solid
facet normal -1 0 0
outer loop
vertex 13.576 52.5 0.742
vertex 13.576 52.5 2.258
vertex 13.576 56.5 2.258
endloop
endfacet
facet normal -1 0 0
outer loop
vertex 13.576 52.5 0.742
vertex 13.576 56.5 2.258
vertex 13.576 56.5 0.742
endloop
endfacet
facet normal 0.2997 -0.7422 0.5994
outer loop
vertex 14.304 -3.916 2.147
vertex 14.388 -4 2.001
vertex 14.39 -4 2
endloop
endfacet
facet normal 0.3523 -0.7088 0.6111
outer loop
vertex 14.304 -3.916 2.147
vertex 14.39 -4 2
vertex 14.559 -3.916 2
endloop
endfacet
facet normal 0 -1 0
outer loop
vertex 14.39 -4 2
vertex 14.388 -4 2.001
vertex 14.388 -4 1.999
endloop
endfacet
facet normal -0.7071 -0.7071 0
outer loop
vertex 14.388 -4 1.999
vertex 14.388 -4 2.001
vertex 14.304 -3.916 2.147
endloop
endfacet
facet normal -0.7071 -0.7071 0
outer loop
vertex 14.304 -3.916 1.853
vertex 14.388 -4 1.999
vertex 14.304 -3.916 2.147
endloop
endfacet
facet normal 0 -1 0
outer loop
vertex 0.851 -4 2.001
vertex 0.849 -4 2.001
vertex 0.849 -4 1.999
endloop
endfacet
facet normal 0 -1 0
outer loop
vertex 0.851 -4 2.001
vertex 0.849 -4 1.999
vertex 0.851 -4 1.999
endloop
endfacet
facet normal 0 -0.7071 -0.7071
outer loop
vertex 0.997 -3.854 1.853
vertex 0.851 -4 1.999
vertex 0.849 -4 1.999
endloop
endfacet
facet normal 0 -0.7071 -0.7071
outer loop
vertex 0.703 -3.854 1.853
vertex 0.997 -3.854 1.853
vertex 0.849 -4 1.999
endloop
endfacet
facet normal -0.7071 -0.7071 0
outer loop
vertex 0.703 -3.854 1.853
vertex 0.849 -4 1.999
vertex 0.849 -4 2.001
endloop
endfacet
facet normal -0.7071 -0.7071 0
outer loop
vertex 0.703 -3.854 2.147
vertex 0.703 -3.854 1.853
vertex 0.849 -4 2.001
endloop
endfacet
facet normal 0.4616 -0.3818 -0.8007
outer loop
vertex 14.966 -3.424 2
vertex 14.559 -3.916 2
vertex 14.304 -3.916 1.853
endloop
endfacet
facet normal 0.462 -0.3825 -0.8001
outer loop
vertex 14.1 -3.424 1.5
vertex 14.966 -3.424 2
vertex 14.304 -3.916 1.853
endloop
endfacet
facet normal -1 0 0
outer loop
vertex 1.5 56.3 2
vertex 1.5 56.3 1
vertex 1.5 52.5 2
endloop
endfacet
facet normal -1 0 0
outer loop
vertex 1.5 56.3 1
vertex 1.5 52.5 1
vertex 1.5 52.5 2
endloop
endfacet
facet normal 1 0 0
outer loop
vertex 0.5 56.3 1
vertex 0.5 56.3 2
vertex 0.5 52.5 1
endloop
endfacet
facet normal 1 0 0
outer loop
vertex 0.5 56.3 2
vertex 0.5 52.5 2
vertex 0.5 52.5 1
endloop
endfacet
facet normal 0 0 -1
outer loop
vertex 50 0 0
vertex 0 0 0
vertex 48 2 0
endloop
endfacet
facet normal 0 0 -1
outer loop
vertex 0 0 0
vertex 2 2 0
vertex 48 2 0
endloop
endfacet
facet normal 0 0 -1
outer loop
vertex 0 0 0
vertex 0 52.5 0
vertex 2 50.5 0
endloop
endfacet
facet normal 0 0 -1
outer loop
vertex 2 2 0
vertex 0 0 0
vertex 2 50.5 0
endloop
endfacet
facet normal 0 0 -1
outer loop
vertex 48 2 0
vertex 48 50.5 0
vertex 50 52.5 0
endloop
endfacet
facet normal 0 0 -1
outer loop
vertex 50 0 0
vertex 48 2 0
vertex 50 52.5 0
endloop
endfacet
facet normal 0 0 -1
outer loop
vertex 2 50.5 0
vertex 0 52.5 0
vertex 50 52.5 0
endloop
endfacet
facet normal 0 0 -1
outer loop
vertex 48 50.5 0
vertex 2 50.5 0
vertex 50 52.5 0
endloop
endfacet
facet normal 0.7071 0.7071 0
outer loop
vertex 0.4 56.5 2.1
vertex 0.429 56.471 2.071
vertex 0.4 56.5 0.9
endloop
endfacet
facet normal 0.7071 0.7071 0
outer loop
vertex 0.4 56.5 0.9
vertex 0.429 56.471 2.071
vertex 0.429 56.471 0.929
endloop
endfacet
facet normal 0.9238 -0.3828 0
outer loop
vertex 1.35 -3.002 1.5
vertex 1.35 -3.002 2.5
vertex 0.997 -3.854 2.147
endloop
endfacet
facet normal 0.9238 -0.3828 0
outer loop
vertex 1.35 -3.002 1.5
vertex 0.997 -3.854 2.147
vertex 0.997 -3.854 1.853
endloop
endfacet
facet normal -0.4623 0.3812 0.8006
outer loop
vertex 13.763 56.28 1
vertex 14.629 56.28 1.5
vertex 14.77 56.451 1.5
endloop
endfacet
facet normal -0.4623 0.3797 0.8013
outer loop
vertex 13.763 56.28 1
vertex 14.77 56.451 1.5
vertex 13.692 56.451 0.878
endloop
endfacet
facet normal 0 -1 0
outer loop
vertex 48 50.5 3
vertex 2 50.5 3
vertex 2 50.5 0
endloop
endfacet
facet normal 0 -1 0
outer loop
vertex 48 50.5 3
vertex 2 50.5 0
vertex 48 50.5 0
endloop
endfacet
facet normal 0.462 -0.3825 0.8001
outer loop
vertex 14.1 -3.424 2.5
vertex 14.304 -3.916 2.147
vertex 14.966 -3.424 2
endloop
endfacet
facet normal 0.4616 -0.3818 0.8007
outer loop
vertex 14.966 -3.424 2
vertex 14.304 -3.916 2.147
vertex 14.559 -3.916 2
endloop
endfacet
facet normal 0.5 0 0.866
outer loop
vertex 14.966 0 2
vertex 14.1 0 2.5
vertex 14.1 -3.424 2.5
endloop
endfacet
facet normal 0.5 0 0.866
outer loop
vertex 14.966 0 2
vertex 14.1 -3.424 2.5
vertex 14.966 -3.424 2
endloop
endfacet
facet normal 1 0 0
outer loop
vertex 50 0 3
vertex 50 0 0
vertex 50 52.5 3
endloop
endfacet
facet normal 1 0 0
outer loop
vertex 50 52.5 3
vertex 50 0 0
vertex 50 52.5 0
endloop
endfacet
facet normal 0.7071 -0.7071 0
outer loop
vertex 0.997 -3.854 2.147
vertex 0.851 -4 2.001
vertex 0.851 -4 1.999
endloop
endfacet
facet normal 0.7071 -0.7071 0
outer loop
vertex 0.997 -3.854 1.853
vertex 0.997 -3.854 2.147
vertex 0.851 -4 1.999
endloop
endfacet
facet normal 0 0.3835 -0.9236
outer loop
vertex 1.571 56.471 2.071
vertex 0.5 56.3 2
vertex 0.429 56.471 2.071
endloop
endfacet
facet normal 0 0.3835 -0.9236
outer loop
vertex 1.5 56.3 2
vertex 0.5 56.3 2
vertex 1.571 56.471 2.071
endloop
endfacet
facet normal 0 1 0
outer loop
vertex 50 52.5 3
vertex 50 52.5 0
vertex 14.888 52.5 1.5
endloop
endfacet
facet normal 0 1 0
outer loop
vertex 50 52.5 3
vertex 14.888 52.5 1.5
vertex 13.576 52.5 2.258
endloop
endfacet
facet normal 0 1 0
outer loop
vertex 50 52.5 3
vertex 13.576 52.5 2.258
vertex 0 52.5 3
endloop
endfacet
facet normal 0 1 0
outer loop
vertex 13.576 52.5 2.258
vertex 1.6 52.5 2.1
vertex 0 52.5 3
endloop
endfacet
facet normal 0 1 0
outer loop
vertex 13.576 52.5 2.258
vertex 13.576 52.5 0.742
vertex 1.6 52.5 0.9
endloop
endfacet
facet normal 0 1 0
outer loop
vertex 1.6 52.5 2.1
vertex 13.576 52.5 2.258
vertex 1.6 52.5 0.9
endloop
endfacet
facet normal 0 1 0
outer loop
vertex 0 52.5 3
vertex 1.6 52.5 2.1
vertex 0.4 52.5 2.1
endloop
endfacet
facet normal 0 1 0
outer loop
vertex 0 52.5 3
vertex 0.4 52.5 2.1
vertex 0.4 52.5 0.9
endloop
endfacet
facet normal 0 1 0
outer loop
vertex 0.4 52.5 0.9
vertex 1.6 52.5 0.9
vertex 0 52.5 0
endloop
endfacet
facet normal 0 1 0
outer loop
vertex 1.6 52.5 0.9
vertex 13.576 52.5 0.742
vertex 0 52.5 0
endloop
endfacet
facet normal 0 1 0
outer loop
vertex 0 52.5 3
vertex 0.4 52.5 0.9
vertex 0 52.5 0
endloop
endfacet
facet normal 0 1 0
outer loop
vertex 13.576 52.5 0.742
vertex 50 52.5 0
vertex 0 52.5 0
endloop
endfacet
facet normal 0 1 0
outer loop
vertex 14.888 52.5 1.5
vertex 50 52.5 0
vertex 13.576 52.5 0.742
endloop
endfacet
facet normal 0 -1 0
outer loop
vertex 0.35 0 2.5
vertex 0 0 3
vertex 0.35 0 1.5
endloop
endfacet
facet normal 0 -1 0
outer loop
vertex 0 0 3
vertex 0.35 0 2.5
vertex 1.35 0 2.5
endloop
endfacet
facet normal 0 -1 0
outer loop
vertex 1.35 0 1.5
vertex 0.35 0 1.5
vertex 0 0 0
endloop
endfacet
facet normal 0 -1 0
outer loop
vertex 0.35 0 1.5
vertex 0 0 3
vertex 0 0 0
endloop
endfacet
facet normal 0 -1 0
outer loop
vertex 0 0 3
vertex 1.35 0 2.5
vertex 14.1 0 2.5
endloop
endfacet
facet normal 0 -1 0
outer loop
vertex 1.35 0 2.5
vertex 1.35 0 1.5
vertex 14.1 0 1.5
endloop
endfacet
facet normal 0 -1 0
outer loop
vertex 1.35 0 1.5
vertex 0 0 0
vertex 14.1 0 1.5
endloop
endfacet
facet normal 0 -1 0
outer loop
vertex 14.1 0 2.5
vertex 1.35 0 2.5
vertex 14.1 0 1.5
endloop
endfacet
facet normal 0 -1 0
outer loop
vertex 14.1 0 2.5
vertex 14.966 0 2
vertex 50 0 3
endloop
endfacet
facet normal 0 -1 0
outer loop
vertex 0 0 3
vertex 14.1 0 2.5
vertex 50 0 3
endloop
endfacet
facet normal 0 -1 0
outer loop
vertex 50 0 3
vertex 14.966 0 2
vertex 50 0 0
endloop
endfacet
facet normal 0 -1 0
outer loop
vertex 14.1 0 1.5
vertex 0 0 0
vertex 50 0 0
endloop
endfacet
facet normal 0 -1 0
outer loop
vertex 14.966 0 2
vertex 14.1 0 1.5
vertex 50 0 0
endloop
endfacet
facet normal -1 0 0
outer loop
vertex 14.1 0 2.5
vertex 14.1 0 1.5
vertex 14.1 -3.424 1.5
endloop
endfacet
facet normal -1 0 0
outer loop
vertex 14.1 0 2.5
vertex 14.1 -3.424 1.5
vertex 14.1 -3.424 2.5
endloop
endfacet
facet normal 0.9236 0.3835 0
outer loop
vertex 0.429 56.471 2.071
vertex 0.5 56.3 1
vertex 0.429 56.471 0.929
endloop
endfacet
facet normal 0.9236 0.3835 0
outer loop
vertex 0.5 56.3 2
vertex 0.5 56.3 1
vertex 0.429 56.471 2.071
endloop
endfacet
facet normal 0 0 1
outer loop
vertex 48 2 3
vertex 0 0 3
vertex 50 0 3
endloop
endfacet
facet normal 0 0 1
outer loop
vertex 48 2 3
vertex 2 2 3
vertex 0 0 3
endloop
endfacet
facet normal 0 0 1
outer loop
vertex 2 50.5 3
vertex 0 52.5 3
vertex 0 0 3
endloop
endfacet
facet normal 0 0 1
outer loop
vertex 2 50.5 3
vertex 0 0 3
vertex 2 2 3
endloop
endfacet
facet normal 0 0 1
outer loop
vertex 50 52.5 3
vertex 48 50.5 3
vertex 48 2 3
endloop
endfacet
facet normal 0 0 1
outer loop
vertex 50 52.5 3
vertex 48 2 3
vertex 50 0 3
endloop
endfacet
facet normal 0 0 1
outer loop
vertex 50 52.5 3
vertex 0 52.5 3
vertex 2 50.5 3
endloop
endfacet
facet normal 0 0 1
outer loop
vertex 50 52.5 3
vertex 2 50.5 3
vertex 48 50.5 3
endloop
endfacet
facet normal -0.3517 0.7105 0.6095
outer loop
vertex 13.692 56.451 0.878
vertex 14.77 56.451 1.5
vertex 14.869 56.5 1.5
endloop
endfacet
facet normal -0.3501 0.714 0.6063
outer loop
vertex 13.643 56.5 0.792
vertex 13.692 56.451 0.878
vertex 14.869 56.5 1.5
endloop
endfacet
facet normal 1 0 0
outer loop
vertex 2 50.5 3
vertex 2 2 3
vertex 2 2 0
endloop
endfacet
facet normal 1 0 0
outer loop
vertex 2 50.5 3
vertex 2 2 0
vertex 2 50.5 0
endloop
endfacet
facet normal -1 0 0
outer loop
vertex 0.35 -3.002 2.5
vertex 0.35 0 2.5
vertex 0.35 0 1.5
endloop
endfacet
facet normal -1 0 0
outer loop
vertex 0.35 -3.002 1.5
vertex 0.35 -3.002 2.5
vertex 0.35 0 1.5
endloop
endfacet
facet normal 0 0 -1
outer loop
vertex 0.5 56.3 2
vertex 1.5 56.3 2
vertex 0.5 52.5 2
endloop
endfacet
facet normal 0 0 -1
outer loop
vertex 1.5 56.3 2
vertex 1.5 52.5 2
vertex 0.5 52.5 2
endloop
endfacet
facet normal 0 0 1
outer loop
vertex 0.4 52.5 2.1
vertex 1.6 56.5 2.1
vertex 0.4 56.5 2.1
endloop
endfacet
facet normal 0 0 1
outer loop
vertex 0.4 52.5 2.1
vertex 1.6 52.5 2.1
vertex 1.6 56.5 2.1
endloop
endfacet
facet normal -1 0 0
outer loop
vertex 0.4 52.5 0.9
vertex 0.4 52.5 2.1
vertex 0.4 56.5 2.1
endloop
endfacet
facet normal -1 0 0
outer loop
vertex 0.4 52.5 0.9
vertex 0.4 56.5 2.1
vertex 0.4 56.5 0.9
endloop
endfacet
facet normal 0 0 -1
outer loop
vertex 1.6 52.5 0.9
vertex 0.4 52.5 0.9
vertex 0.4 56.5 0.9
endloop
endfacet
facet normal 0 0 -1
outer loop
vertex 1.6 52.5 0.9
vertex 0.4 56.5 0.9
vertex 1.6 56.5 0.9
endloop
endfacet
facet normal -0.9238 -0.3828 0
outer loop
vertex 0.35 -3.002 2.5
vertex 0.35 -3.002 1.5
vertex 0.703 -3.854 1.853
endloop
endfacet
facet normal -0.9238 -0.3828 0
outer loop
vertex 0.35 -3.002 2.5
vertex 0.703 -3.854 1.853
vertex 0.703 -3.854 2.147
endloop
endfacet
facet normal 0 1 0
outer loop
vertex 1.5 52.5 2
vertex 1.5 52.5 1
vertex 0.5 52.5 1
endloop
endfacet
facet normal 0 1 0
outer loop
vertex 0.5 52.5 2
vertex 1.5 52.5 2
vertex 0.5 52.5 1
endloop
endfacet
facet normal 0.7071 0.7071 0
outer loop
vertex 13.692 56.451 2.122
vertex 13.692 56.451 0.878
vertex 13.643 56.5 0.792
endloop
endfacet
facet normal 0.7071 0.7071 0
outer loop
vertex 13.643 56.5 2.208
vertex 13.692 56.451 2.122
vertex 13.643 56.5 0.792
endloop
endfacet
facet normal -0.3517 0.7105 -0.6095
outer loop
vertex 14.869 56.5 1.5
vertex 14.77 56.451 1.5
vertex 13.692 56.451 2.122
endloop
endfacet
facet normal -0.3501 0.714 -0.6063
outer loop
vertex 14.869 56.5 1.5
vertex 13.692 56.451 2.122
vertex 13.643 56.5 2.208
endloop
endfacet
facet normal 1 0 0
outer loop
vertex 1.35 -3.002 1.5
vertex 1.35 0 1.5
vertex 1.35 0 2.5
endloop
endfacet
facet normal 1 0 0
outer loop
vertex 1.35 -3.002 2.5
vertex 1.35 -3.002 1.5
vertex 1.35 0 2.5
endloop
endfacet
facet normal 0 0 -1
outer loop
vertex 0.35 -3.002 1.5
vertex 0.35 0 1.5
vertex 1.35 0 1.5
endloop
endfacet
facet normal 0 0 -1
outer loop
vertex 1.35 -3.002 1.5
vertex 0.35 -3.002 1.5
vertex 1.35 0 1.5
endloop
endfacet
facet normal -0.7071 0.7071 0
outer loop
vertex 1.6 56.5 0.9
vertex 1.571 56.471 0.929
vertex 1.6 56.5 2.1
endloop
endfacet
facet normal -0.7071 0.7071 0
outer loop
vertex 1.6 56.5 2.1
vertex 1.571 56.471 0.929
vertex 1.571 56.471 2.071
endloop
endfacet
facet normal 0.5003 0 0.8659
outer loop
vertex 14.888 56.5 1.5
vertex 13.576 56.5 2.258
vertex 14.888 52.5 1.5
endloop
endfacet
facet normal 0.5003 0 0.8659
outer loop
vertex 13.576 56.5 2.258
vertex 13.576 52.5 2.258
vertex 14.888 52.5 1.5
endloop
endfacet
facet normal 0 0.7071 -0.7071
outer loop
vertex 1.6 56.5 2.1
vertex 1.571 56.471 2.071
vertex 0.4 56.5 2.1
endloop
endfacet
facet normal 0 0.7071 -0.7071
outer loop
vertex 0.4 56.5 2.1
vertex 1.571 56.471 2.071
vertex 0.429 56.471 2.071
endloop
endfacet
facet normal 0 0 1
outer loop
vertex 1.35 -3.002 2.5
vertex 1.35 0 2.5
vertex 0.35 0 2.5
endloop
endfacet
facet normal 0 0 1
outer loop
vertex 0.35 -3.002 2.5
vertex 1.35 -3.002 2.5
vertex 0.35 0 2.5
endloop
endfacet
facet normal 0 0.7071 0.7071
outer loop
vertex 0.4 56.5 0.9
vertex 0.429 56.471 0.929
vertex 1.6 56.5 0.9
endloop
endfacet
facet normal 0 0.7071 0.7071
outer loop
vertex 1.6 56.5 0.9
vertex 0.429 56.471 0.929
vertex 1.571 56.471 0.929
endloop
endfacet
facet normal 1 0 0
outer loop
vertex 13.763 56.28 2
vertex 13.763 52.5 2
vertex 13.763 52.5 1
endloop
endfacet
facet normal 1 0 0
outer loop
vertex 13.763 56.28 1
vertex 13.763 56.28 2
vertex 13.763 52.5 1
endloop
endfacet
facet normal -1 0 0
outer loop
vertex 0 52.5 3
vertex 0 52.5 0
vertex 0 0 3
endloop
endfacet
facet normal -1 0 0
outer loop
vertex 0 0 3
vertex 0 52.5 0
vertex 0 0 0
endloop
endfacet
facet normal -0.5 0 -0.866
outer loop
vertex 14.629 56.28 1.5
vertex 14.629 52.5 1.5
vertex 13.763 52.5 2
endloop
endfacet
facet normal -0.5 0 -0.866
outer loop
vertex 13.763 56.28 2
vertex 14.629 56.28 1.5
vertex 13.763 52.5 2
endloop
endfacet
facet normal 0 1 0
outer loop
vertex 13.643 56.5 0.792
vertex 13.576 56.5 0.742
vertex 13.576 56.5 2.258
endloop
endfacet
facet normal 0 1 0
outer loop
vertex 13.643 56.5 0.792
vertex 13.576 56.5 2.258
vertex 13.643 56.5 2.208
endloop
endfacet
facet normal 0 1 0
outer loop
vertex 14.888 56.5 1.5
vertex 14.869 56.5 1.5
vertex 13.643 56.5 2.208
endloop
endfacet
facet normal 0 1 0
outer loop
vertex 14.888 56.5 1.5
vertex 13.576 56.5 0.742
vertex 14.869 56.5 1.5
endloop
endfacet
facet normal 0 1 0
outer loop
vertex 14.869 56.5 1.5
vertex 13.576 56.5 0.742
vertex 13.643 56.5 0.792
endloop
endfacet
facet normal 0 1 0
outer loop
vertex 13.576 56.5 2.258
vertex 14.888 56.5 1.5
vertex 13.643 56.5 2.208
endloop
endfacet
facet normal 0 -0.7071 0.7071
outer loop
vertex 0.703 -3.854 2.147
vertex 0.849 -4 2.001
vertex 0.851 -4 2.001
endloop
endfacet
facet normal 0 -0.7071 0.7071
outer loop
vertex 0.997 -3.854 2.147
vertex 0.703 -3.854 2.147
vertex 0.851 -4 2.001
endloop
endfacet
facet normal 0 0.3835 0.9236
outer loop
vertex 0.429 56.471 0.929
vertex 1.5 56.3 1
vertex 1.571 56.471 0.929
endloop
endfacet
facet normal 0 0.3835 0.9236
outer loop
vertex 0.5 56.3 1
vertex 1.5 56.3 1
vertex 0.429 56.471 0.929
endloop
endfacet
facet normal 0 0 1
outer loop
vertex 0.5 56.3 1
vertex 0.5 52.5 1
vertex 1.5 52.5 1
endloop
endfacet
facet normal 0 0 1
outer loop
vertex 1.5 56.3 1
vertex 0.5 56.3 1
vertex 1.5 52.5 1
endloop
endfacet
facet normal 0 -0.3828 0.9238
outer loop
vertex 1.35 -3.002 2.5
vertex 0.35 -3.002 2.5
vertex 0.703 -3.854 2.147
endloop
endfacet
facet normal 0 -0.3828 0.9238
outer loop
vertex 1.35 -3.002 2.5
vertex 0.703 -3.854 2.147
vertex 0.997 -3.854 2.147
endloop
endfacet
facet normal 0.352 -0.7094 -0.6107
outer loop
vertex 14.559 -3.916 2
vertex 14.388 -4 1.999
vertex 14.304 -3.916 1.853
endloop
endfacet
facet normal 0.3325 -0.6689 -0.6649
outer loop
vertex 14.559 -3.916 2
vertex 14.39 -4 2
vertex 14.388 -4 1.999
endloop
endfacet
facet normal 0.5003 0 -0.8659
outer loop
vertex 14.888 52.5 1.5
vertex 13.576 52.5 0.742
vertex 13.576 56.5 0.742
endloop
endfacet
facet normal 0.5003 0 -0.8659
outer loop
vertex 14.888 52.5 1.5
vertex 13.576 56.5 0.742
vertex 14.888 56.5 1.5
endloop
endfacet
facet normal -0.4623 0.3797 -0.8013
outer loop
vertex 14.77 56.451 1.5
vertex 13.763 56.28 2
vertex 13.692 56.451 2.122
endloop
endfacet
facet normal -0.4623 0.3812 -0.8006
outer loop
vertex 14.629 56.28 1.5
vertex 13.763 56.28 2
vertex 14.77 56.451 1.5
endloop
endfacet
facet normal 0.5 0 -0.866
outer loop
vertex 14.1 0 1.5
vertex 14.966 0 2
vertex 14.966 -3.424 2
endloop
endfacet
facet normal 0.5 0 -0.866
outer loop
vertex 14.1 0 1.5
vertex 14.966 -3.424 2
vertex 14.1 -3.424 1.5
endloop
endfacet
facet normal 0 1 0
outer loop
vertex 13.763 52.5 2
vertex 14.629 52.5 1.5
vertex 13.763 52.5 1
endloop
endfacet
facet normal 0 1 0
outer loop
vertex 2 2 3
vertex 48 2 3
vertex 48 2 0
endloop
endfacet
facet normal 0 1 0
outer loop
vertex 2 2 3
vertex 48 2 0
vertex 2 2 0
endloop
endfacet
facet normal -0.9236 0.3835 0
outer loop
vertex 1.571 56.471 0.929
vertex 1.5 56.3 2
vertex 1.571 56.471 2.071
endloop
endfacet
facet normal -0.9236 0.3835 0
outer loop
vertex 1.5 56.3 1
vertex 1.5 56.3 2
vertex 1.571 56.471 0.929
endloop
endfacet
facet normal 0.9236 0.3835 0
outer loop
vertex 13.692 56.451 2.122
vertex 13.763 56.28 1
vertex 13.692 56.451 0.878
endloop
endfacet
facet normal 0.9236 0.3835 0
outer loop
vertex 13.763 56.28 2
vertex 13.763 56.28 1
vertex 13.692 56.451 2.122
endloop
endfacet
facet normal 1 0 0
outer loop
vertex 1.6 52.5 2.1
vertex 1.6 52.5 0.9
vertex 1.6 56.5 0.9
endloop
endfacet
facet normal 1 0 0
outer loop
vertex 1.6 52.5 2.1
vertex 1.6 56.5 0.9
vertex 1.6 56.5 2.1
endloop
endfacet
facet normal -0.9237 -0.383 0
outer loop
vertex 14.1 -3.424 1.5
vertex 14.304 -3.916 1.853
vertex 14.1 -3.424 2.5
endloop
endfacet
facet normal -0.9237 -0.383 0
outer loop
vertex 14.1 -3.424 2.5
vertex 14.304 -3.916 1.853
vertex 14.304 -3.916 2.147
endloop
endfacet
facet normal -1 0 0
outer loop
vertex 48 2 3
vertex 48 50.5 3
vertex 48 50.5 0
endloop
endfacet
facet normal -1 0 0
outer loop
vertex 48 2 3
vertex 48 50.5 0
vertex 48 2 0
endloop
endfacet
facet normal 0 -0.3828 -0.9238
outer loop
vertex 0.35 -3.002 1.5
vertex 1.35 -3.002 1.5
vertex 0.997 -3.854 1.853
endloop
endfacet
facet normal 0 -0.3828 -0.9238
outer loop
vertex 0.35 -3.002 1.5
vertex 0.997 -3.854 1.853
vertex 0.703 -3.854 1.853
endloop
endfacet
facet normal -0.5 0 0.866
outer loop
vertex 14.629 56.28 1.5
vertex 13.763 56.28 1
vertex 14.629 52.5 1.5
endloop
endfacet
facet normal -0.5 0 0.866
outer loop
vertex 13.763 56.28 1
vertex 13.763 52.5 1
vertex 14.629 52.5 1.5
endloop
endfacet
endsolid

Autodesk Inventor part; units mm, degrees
ref_plane "YZ Plane" through (0, 0, 0) normal (1, 0, 0) x (0, 1, 0)
ref_plane "XZ Plane" through (0, 0, 0) normal (0, 1, 0) x (-1, 0, 0)
ref_plane "XY Plane" through (0, 0, 0) normal (0, 0, 1) x (1, 0, 0)
sketch "Sketch1" plane through (0, 0, 0) normal (0, 0, 1) x (1, 0, 0)
  line L0 (0, 0) -> (50, 0)
  line L1 (50, 0) -> (50, 52.5)
  line L2 (50, 52.5) -> (0, 52.5)
  line L3 (0, 52.5) -> (0, 0)
  dimension "d0" = 50
  dimension "d1" = 52.5
extrude "Extrusion1" add sketch "Sketch1" along normal blind 3
sketch "Sketch2" plane through (0, 0, 3) normal (0, 0, 1) x (1, 0, 0)
  line L0 (2, 50.5) -> (48, 50.5)
  line L1 (48, 50.5) -> (48, 2)
  line L2 (48, 2) -> (2, 2)
  line L3 (2, 2) -> (2, 50.5)
  dimension "d4" = 46
  dimension "d5" = 48.5
extrude "Extrusion2" cut sketch "Sketch2" against normal blind 10
sketch "Sketch5" plane through (0, 0, 0) normal (0, -1, 0) x (1, 0, 0)
  line L0 (12.85, 2.5) -> (12.85, 1.5) projected
  line L1 (2.85, 1.5) -> (2.85, 2.5) projected
  line L2 (0, 0) -> (50, 0) projected
  line L3 (14.1, 2.5) -> (14.966, 2)
  line L4 (14.966, 2) -> (14.1, 1.5)
  line L5 (14.1, 1.5) -> (14.1, 2.5)
  line L6 (2, 3) -> (48, 3) projected
  line L7 (1.35, 2.5) -> (0.35, 2.5)
  line L8 (0.35, 2.5) -> (0.35, 1.5)
  line L9 (0.35, 1.5) -> (1.35, 1.5)
  line L10 (1.35, 1.5) -> (1.35, 2.5)
  dimension "d24" = 1
  dimension "d25" = 1
  dimension "d26" = 1.5
  dimension "d27" = 1.25
  dimension "d28" = 1
  dimension "d29" = 1
  dimension "d30" = 1
  dimension "d31" = 1
  dimension "d32" = 1
  dimension "d33" = 0.5
  dimension "d34" = 1.5
extrude "Extrusion5" add sketch "Sketch5" along normal blind 4
chamfer "Chamfer3" distance 0.288 angle 45 3 edges at (14.533, -4, 1.75) (14.1, -4, 2) (14.533, -4, 2.25)
chamfer "Chamfer4" distance 0.288 angle 45 3 edges at (14.533, -3.712, 1.75) (14.1, -3.712, 2) (14.533, -3.712, 2.25)
chamfer "Chamfer5" distance 0.499 angle 45 4 edges at (0.85, -4, 1.5) (1.35, -4, 2) (0.85, -4, 2.5) (0.35, -4, 2)
chamfer "Chamfer6" distance 0.499 angle 45 4 edges at (0.85, -3.501, 1.5) (1.35, -3.501, 2) (0.85, -3.501, 2.5) (0.35, -3.501, 2)
sketch "Sketch8" plane through (0, 52.5, 0) normal (0, 1, 0) x (1, 0, 0)
  line L0 (50, 0) -> (0, 0) projected
  line L1 (50, 0) -> (50, -3) projected
  line L2 (13.7626, -1) -> (14.6286, -1.5)
  line L3 (13.7626, -1) -> (14.7626, -1) construction
  line L4 (14.6286, -1.5) -> (13.7626, -2)
  line L5 (12.66, -2.77) -> (12.66, -0.23) projected
  line L6 (13.7626, -2) -> (13.7626, -1)
  line L7 (13.5765, -2.1075) -> (13.5765, -0.8925)
  line L8 (13.5765, -0.8925) -> (13.5765, -0.7425)
  line L9 (13.5765, -0.7425) -> (14.8884, -1.5)
  line L10 (13.5765, -2.1075) -> (13.5765, -2.2575)
  line L11 (13.5765, -2.2575) -> (14.8884, -1.5)
  dimension "d60" = 1
  dimension "d61" = 30
  dimension "d62" = 1
  dimension "d63" = 60
  dimension "d64" = 1
  dimension "d65" = 35.3714
  dimension "d66" = 0.15
  dimension "d67" = 60
  dimension "d68" = 0.15
extrude "Extrusion8" add sketch "Sketch8" along normal blind 4
chamfer "Chamfer7" distance 0.12 angle 45 3 edges at (14.1956, 56.5, 1.75) (13.7626, 56.5, 1.5) (14.1956, 56.5, 1.25)
sketch "Sketch9" plane through (0, 52.5, 0) normal (0, 1, 0) x (1, 0, 0)
  line L0 (50, 0) -> (0, 0) projected
  line L1 (0, 0) -> (0, -3) projected
  line L2 (50, -3) -> (0, -3) projected
  line L3 (2, -2.77) -> (2, -0.23) projected
  line L4 (1.5, -2) -> (0.5, -2)
  line L5 (0.5, -2) -> (0.5, -1)
  line L6 (0.5, -1) -> (1.5, -1)
  line L7 (1.5, -1) -> (1.5, -2)
  line L8 (1.6, -2.1) -> (0.4, -2.1)
  line L9 (0.4, -2.1) -> (0.4, -0.9)
  line L10 (0.4, -0.9) -> (1.6, -0.9)
  line L11 (1.6, -0.9) -> (1.6, -2.1)
  dimension "d74" = 1
  dimension "d75" = 1
  dimension "d76" = 0.5
  dimension "d77" = 1
  dimension "d78" = 1
  dimension "d79" = 0.5
  dimension "d81" = 1.2
  dimension "d82" = 1.2
extrude "Extrusion9" add sketch "Sketch9" along normal blind 4
chamfer "Chamfer8" distance 0.1 angle 45 4 edges at (1.5, 56.5, 1.5) (1, 56.5, 2) (0.5, 56.5, 1.5) (1, 56.5, 1)
chamfer "Chamfer9" distance 0.1 angle 45 4 edges at (0.5, 56.4005, 1.5) (1, 56.4005, 2) (1.5, 56.4005, 1.5) (1, 56.4005, 1)
chamfer "Chamfer10" distance 0.1 angle 45 3 edges at (14.1956, 56.38, 1.75) (13.7626, 56.38, 1.5) (14.1956, 56.38, 1.25)
properties part number "Zijplaat 1.1"
